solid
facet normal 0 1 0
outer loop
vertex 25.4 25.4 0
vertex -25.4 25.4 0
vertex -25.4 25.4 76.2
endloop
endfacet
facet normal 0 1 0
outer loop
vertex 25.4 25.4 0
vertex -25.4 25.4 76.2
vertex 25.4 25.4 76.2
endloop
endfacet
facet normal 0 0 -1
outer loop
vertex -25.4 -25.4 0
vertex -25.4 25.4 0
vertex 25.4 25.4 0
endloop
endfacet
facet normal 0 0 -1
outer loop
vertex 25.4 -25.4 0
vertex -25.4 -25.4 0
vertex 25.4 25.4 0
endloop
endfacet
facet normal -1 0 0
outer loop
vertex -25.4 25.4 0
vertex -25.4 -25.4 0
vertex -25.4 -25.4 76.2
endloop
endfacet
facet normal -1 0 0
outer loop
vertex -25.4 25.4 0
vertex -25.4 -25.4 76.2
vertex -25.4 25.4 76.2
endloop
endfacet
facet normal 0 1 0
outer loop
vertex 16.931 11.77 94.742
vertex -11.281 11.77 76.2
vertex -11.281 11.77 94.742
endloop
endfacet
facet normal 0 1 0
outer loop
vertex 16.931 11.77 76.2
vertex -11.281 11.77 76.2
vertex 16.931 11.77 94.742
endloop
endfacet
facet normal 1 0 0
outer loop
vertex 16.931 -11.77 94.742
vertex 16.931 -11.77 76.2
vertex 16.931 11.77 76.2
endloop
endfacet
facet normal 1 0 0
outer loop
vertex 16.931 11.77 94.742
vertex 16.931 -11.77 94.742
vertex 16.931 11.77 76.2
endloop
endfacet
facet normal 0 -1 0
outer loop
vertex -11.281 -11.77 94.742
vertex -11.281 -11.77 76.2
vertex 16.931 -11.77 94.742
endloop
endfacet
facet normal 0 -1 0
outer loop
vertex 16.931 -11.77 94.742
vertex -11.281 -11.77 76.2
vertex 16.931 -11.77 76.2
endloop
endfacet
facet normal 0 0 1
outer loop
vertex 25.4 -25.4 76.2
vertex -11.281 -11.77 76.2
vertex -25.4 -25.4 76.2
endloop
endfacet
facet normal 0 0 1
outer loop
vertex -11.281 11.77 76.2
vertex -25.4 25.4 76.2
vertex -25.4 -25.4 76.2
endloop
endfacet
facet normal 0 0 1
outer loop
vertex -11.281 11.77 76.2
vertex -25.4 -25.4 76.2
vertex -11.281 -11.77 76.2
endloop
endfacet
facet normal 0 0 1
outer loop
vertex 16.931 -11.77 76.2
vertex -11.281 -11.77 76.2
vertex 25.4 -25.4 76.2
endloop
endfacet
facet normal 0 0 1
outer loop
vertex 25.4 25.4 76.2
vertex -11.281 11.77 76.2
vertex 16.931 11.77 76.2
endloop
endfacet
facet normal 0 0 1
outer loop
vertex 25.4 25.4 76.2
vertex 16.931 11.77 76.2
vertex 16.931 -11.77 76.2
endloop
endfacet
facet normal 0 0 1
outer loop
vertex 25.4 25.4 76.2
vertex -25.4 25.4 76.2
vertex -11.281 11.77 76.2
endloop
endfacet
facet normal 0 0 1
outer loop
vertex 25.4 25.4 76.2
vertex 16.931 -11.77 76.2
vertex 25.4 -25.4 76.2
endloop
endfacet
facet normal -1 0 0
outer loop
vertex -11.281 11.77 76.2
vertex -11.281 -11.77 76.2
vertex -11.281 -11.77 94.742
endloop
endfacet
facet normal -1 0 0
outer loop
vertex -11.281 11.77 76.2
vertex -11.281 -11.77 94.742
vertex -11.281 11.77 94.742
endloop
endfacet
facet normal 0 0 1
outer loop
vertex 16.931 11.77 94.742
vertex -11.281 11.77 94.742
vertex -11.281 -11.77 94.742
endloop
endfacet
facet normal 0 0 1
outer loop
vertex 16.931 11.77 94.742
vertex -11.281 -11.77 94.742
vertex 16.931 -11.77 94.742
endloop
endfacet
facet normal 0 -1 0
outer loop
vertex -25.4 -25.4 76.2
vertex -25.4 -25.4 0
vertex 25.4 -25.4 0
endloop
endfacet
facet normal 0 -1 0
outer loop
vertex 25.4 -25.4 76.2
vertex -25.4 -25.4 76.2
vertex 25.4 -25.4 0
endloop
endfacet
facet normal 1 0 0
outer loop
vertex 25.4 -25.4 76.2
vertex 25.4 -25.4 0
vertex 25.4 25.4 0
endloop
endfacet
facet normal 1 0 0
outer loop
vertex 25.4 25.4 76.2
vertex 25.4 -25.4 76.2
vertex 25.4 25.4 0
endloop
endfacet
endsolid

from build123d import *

# Parameters (mm, degrees)
F0_W     = 50.8
F0_H     = 50.8
F1_DEPTH = 76.2
F2_W     = 28.211626
F2_H     = 23.540352
F3_DEPTH = 94.742


with BuildPart() as f1:
    # F0 (on Top) → F1 (new body)
    with BuildSketch(Plane.XY):
        Rectangle(F0_W, F0_H)
    extrude(amount=F1_DEPTH)

    # F2 (on Top) → F3 (join)
    with BuildSketch(Plane.XY):
        with Locations((2.824979, 0)):
            Rectangle(F2_W, F2_H)
    extrude(amount=F3_DEPTH)


solid = f1.part
